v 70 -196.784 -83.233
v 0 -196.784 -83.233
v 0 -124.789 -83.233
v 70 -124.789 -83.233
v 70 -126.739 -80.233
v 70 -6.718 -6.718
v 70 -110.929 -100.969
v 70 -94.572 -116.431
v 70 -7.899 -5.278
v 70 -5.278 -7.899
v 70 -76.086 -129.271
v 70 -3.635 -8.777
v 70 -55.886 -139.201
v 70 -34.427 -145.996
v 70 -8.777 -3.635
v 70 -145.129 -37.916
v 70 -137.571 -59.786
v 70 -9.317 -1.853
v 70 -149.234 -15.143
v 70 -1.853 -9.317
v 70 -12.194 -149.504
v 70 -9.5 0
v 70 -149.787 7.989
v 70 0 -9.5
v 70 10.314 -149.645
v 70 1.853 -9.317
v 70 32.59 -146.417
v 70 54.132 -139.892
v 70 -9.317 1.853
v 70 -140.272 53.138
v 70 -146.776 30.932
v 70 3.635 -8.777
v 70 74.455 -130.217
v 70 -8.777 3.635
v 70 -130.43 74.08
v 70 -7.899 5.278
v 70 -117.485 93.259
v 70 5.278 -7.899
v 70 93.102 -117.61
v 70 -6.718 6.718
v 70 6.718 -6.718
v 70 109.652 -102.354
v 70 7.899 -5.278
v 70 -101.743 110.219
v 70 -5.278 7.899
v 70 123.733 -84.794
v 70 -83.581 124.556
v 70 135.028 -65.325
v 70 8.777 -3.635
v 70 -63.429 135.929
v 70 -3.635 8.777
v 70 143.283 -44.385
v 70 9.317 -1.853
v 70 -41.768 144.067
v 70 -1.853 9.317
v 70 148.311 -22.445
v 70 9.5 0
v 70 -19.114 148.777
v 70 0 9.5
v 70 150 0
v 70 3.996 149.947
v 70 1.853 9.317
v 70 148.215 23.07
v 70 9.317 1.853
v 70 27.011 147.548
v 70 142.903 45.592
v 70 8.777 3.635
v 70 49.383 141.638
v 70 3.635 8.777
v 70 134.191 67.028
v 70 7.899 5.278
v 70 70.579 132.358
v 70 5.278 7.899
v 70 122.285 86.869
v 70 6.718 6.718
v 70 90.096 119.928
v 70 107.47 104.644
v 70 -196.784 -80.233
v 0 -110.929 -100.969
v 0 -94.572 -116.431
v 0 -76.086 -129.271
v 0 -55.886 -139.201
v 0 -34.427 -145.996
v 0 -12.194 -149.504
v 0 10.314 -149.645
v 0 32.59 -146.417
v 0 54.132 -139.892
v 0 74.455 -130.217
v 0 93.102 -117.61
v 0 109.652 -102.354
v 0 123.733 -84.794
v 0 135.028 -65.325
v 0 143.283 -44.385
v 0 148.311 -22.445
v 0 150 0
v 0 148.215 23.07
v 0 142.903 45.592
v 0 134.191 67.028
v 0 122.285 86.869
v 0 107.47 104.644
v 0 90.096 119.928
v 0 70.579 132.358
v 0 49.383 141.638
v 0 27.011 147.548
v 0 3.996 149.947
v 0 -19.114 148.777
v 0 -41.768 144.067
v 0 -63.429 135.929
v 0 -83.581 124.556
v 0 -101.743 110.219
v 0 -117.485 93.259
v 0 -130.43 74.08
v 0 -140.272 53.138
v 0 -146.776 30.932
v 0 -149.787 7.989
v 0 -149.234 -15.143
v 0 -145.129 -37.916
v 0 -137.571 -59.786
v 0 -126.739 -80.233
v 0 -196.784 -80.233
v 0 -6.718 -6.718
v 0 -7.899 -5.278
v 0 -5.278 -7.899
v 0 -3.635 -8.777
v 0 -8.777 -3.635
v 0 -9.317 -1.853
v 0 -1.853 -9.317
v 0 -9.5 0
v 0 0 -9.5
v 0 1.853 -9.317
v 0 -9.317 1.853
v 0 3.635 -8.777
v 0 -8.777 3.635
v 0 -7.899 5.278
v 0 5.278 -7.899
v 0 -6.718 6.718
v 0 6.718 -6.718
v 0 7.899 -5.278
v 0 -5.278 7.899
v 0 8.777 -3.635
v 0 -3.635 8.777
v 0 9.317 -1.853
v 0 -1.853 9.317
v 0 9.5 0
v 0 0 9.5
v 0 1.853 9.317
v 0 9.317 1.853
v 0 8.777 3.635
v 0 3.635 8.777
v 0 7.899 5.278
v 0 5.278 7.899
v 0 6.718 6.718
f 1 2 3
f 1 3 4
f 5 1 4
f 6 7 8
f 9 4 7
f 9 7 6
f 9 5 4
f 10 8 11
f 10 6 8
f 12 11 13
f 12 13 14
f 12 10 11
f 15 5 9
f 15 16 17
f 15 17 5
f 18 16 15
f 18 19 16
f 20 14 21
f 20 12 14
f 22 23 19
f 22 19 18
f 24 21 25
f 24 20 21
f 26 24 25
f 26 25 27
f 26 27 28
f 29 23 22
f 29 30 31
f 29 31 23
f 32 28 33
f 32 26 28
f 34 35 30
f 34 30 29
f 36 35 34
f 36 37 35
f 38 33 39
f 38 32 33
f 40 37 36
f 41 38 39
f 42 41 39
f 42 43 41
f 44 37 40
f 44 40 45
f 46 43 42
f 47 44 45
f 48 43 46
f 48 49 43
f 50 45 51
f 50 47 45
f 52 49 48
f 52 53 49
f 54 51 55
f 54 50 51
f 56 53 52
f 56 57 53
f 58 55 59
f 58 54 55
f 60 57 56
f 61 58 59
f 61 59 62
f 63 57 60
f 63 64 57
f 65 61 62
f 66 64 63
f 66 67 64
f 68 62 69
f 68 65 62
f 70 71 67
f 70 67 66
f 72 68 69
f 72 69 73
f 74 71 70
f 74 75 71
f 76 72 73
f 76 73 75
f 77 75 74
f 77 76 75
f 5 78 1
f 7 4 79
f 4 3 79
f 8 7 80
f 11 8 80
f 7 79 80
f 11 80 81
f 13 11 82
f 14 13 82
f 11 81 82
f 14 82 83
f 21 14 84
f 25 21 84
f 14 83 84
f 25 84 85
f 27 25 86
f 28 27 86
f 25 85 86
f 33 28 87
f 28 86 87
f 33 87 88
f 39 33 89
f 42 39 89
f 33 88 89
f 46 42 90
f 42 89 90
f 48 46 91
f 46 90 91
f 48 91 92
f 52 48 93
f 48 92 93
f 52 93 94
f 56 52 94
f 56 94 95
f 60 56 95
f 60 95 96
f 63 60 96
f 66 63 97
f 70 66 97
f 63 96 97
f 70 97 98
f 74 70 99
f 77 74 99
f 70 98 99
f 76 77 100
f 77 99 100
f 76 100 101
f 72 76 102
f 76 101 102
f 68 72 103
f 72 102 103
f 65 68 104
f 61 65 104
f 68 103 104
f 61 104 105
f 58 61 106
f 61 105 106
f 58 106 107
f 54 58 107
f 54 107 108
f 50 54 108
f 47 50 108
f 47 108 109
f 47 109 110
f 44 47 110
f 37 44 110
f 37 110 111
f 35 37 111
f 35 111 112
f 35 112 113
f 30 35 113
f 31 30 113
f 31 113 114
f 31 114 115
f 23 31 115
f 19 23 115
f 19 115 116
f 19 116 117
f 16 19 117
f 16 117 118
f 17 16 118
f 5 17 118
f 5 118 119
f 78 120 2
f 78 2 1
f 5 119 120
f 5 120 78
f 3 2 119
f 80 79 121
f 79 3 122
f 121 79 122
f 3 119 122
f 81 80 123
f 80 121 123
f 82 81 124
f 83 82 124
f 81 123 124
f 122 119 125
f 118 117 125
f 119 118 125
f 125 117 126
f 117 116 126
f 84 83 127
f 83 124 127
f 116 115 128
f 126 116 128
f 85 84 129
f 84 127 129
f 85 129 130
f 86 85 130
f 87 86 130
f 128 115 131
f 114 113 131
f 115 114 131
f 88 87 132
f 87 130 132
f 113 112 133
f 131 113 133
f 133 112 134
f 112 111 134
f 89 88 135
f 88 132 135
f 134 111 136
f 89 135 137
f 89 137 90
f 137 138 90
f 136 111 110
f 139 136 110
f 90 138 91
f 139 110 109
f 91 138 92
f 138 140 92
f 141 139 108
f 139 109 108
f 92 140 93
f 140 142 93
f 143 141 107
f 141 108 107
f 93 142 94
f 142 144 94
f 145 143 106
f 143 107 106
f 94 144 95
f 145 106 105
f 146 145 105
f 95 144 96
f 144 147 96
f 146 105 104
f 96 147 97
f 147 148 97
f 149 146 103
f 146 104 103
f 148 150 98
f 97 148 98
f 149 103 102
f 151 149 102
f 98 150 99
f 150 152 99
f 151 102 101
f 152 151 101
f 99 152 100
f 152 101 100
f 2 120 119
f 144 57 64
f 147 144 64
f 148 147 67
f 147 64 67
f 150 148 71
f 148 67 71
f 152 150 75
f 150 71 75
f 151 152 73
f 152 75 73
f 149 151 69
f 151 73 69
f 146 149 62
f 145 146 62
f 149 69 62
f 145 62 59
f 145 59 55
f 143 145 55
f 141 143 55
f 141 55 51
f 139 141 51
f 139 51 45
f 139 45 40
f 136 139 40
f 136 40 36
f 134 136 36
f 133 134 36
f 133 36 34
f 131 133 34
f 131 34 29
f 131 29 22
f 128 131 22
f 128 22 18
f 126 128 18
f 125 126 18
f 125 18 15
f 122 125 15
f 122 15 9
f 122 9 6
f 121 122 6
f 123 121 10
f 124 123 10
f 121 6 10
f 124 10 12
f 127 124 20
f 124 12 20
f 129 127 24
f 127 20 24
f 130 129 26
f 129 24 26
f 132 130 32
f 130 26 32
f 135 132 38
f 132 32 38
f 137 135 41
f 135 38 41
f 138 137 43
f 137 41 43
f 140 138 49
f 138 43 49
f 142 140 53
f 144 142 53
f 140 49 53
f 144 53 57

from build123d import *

# Parameters (mm, degrees)
F0_R     = 150
F1_DEPTH = 70
F2_W     = 70
F2_H     = 3
F3_DEPTH = 196.784
F4_R     = 9.5
F5_DEPTH = 184


with BuildPart() as f1:
    # F0 (on Right) → F1 (new body)
    with BuildSketch(Plane.YZ):
        Circle(F0_R)
    extrude(amount=F1_DEPTH)

    # F2 (on Front) → F3 (join)
    with BuildSketch(Plane.XZ):
        with Locations((35, -81.733)):
            Rectangle(F2_W, F2_H)
    extrude(amount=F3_DEPTH)

    # F4 (on face) → F5 (cut)
    with BuildSketch(Plane.YZ.offset(70)):
        Circle(F4_R)
    extrude(amount=-F5_DEPTH, mode=Mode.SUBTRACT)


solid = f1.part
